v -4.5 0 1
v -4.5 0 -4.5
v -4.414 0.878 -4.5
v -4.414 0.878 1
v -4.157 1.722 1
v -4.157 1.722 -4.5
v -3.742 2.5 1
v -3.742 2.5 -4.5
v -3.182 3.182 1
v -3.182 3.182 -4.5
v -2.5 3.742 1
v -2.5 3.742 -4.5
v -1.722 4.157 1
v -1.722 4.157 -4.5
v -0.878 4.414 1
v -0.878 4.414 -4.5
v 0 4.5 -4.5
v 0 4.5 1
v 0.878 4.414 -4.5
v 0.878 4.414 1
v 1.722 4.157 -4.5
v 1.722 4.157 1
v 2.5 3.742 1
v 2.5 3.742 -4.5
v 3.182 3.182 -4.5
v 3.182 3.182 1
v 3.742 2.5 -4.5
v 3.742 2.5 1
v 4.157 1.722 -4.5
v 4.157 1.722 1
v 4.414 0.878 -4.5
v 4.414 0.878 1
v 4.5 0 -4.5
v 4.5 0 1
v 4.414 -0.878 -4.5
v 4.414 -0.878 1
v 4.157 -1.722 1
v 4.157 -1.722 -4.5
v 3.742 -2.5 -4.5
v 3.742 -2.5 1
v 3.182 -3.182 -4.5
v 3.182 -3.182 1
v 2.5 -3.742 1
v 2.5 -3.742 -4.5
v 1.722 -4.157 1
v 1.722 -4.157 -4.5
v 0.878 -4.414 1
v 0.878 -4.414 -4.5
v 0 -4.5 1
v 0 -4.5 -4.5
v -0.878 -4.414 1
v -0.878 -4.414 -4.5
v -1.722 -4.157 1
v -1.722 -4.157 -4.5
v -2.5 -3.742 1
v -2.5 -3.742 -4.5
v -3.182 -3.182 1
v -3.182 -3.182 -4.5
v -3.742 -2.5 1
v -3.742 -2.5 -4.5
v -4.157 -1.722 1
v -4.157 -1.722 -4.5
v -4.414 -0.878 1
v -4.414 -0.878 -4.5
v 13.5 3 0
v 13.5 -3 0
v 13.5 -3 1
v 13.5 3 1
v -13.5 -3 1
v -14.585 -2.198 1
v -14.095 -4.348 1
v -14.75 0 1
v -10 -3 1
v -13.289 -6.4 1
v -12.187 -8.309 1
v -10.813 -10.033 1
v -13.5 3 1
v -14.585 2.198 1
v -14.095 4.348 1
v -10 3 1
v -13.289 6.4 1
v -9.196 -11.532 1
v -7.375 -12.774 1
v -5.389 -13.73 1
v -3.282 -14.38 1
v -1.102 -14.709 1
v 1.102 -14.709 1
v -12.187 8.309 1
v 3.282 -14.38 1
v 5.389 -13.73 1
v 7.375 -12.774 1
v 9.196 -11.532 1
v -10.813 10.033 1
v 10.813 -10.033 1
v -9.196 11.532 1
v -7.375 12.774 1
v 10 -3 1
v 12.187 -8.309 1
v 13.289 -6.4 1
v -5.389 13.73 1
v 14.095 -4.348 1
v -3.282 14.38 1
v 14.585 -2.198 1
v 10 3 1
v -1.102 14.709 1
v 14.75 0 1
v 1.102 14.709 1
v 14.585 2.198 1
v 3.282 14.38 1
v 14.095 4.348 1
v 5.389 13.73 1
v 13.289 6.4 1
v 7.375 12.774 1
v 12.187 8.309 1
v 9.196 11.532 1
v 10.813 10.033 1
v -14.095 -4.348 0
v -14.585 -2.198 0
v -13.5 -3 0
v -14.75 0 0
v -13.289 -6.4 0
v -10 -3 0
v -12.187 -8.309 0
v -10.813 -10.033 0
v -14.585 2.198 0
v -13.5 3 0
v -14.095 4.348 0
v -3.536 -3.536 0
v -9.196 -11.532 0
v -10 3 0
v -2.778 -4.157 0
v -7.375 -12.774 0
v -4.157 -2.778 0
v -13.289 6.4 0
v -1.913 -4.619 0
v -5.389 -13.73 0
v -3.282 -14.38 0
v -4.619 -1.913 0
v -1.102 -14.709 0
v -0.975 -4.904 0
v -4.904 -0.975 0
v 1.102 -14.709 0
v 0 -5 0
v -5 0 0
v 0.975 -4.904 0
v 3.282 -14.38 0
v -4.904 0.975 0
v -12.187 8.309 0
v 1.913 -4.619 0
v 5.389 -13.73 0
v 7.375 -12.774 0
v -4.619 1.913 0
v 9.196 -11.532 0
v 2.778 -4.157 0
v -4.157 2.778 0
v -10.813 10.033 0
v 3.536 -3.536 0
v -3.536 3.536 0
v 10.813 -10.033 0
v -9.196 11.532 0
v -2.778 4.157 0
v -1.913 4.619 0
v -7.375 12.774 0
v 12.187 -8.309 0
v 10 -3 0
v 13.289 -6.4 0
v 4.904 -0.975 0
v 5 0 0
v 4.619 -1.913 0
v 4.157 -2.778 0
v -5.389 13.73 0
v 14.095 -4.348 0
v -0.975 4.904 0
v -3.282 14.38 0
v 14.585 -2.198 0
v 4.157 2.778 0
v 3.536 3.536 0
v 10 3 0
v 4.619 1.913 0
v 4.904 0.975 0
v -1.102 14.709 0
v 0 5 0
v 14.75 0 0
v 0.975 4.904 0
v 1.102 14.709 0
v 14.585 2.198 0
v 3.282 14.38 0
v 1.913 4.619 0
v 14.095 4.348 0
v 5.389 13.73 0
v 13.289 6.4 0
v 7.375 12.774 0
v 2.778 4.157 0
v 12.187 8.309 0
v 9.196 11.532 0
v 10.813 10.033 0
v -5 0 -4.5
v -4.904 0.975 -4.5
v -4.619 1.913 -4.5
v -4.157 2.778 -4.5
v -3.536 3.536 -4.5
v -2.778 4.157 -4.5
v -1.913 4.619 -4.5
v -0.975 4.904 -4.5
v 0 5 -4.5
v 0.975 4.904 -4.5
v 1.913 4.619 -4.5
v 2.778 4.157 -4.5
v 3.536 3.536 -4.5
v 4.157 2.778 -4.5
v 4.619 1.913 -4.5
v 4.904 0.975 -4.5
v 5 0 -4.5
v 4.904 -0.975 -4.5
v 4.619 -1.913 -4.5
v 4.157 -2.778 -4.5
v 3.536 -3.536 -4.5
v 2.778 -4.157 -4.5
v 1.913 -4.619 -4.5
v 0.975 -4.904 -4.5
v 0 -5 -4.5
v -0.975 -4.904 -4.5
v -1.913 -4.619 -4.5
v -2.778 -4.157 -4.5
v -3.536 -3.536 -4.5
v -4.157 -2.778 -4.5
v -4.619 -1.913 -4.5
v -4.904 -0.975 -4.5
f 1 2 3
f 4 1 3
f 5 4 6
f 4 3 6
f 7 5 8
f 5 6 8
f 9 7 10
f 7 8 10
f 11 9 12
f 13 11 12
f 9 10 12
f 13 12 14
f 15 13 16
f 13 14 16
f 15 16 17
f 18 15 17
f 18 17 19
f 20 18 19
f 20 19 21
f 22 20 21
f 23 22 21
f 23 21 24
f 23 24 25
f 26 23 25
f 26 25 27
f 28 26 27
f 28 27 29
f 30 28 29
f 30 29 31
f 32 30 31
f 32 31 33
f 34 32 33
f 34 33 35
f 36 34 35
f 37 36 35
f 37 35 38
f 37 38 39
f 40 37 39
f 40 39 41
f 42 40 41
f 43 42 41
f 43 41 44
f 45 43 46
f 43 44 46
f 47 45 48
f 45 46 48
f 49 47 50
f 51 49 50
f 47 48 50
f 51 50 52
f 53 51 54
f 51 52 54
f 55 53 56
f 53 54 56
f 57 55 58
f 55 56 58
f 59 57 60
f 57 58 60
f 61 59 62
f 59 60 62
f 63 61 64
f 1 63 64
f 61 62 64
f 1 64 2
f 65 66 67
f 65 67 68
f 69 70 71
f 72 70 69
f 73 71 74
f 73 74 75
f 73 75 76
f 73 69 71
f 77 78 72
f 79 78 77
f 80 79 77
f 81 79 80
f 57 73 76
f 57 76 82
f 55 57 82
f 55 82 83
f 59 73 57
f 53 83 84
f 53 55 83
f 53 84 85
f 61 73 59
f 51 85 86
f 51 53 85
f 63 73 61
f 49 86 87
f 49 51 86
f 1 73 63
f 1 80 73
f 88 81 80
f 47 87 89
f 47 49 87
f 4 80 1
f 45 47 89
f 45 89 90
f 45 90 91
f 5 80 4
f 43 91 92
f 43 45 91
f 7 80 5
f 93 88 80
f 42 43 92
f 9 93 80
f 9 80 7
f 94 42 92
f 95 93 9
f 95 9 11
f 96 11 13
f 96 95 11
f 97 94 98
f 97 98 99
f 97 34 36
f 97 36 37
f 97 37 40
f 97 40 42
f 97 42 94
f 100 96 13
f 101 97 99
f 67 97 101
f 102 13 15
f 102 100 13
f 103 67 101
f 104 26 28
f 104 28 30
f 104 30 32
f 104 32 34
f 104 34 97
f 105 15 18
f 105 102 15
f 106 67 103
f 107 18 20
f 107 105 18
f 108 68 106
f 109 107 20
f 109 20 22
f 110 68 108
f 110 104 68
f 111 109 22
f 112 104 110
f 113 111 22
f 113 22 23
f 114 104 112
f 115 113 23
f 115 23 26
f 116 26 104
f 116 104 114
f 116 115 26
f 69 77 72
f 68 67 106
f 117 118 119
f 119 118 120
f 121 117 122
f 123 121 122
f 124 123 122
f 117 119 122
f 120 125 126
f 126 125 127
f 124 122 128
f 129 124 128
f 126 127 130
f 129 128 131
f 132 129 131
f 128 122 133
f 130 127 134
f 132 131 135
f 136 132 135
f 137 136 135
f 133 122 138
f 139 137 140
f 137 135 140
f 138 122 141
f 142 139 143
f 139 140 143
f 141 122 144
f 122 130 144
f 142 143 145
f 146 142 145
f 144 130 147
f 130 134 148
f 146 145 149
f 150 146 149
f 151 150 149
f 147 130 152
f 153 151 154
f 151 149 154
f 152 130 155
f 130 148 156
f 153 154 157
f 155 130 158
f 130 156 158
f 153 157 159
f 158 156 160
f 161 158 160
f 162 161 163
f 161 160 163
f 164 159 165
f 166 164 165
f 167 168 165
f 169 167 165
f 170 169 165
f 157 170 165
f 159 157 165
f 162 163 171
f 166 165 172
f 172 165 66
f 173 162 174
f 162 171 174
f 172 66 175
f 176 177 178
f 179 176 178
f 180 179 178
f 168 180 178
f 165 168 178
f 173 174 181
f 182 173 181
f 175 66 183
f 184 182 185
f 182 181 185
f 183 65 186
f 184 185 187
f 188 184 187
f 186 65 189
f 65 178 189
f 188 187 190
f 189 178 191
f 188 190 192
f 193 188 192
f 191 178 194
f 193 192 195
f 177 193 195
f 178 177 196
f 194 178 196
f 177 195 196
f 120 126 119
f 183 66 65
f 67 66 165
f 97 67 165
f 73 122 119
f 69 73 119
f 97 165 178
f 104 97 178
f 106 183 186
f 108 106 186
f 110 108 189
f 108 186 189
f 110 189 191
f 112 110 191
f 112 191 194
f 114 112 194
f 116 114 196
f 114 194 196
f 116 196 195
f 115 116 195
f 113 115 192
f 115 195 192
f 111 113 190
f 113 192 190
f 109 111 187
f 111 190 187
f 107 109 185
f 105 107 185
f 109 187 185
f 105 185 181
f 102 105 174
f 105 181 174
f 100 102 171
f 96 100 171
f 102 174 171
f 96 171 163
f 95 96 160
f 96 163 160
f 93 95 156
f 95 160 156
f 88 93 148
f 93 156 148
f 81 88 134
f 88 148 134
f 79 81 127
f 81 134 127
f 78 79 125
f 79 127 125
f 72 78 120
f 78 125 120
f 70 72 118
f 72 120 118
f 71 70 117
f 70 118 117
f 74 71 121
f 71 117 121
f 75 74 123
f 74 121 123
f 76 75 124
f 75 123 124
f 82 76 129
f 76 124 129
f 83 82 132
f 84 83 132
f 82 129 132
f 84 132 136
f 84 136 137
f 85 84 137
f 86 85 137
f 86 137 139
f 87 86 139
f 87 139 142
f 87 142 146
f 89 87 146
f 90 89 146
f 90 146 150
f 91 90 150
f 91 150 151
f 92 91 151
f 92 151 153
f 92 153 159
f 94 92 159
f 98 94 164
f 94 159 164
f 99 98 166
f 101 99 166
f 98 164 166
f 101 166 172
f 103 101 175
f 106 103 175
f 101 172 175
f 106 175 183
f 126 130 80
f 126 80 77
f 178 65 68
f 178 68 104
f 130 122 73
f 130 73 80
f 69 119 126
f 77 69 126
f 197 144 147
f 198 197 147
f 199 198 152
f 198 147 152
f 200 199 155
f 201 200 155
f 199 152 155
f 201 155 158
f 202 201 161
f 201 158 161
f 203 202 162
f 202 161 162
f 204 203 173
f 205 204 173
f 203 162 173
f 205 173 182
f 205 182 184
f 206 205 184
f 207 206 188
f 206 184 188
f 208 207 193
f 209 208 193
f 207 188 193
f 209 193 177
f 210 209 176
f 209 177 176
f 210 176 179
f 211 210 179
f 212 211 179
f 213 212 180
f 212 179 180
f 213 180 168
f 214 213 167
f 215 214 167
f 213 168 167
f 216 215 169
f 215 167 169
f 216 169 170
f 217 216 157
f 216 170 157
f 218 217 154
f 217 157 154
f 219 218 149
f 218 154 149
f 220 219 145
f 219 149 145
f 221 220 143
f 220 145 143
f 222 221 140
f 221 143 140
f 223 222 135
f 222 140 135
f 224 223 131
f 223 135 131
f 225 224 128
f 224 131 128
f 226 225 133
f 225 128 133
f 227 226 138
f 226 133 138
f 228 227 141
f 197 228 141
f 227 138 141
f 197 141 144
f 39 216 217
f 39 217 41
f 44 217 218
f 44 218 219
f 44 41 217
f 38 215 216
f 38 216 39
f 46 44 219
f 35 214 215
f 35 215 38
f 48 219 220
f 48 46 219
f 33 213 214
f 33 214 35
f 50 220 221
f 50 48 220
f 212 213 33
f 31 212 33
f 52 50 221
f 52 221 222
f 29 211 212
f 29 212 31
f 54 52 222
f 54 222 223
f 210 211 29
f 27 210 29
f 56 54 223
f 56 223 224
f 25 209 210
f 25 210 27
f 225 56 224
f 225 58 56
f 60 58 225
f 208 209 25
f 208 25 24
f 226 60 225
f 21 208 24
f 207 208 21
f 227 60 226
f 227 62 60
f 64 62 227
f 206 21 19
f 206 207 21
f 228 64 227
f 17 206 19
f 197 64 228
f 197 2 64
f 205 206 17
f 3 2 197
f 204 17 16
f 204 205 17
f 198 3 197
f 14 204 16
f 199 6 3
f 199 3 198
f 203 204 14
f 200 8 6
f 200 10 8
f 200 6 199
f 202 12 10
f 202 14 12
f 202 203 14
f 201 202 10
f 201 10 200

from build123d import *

# Parameters (mm, degrees)
SKETCH1_R           = 14.75
BOSS_EXTRUDE1_DEPTH = 1
SKETCH2_R           = 5
BOSS_EXTRUDE2_DEPTH = 4.5
SKETCH3_R           = 4.5
SKETCH3_W           = 3.5
SKETCH3_H           = 6
CUT_EXTRUDE1_DEPTH  = 6.5


with BuildPart() as part:
    # Sketch1 → Boss-Extrude1 (new body)
    with BuildSketch(Plane.XY):
        Circle(SKETCH1_R)
    extrude(amount=BOSS_EXTRUDE1_DEPTH)

    # Sketch2 → Boss-Extrude2 (add)
    with BuildSketch(Plane(origin=(0, 0, 0), x_dir=(-1, 0, 0), z_dir=(0, 0, -1))):
        Circle(SKETCH2_R)
    extrude(amount=BOSS_EXTRUDE2_DEPTH)

    # Sketch3 → Cut-Extrude1 (cut, through all)
    with BuildSketch(Plane(origin=(0, 0, -4.5), x_dir=(-1, 0, 0), z_dir=(0, 0, -1))):
        Circle(SKETCH3_R)
        with Locations((-11.75, 0)):
            Rectangle(SKETCH3_W, SKETCH3_H)
        with Locations((11.75, 0)):
            Rectangle(SKETCH3_W, SKETCH3_H)
    extrude(amount=-CUT_EXTRUDE1_DEPTH, mode=Mode.SUBTRACT)


solid = part.part
